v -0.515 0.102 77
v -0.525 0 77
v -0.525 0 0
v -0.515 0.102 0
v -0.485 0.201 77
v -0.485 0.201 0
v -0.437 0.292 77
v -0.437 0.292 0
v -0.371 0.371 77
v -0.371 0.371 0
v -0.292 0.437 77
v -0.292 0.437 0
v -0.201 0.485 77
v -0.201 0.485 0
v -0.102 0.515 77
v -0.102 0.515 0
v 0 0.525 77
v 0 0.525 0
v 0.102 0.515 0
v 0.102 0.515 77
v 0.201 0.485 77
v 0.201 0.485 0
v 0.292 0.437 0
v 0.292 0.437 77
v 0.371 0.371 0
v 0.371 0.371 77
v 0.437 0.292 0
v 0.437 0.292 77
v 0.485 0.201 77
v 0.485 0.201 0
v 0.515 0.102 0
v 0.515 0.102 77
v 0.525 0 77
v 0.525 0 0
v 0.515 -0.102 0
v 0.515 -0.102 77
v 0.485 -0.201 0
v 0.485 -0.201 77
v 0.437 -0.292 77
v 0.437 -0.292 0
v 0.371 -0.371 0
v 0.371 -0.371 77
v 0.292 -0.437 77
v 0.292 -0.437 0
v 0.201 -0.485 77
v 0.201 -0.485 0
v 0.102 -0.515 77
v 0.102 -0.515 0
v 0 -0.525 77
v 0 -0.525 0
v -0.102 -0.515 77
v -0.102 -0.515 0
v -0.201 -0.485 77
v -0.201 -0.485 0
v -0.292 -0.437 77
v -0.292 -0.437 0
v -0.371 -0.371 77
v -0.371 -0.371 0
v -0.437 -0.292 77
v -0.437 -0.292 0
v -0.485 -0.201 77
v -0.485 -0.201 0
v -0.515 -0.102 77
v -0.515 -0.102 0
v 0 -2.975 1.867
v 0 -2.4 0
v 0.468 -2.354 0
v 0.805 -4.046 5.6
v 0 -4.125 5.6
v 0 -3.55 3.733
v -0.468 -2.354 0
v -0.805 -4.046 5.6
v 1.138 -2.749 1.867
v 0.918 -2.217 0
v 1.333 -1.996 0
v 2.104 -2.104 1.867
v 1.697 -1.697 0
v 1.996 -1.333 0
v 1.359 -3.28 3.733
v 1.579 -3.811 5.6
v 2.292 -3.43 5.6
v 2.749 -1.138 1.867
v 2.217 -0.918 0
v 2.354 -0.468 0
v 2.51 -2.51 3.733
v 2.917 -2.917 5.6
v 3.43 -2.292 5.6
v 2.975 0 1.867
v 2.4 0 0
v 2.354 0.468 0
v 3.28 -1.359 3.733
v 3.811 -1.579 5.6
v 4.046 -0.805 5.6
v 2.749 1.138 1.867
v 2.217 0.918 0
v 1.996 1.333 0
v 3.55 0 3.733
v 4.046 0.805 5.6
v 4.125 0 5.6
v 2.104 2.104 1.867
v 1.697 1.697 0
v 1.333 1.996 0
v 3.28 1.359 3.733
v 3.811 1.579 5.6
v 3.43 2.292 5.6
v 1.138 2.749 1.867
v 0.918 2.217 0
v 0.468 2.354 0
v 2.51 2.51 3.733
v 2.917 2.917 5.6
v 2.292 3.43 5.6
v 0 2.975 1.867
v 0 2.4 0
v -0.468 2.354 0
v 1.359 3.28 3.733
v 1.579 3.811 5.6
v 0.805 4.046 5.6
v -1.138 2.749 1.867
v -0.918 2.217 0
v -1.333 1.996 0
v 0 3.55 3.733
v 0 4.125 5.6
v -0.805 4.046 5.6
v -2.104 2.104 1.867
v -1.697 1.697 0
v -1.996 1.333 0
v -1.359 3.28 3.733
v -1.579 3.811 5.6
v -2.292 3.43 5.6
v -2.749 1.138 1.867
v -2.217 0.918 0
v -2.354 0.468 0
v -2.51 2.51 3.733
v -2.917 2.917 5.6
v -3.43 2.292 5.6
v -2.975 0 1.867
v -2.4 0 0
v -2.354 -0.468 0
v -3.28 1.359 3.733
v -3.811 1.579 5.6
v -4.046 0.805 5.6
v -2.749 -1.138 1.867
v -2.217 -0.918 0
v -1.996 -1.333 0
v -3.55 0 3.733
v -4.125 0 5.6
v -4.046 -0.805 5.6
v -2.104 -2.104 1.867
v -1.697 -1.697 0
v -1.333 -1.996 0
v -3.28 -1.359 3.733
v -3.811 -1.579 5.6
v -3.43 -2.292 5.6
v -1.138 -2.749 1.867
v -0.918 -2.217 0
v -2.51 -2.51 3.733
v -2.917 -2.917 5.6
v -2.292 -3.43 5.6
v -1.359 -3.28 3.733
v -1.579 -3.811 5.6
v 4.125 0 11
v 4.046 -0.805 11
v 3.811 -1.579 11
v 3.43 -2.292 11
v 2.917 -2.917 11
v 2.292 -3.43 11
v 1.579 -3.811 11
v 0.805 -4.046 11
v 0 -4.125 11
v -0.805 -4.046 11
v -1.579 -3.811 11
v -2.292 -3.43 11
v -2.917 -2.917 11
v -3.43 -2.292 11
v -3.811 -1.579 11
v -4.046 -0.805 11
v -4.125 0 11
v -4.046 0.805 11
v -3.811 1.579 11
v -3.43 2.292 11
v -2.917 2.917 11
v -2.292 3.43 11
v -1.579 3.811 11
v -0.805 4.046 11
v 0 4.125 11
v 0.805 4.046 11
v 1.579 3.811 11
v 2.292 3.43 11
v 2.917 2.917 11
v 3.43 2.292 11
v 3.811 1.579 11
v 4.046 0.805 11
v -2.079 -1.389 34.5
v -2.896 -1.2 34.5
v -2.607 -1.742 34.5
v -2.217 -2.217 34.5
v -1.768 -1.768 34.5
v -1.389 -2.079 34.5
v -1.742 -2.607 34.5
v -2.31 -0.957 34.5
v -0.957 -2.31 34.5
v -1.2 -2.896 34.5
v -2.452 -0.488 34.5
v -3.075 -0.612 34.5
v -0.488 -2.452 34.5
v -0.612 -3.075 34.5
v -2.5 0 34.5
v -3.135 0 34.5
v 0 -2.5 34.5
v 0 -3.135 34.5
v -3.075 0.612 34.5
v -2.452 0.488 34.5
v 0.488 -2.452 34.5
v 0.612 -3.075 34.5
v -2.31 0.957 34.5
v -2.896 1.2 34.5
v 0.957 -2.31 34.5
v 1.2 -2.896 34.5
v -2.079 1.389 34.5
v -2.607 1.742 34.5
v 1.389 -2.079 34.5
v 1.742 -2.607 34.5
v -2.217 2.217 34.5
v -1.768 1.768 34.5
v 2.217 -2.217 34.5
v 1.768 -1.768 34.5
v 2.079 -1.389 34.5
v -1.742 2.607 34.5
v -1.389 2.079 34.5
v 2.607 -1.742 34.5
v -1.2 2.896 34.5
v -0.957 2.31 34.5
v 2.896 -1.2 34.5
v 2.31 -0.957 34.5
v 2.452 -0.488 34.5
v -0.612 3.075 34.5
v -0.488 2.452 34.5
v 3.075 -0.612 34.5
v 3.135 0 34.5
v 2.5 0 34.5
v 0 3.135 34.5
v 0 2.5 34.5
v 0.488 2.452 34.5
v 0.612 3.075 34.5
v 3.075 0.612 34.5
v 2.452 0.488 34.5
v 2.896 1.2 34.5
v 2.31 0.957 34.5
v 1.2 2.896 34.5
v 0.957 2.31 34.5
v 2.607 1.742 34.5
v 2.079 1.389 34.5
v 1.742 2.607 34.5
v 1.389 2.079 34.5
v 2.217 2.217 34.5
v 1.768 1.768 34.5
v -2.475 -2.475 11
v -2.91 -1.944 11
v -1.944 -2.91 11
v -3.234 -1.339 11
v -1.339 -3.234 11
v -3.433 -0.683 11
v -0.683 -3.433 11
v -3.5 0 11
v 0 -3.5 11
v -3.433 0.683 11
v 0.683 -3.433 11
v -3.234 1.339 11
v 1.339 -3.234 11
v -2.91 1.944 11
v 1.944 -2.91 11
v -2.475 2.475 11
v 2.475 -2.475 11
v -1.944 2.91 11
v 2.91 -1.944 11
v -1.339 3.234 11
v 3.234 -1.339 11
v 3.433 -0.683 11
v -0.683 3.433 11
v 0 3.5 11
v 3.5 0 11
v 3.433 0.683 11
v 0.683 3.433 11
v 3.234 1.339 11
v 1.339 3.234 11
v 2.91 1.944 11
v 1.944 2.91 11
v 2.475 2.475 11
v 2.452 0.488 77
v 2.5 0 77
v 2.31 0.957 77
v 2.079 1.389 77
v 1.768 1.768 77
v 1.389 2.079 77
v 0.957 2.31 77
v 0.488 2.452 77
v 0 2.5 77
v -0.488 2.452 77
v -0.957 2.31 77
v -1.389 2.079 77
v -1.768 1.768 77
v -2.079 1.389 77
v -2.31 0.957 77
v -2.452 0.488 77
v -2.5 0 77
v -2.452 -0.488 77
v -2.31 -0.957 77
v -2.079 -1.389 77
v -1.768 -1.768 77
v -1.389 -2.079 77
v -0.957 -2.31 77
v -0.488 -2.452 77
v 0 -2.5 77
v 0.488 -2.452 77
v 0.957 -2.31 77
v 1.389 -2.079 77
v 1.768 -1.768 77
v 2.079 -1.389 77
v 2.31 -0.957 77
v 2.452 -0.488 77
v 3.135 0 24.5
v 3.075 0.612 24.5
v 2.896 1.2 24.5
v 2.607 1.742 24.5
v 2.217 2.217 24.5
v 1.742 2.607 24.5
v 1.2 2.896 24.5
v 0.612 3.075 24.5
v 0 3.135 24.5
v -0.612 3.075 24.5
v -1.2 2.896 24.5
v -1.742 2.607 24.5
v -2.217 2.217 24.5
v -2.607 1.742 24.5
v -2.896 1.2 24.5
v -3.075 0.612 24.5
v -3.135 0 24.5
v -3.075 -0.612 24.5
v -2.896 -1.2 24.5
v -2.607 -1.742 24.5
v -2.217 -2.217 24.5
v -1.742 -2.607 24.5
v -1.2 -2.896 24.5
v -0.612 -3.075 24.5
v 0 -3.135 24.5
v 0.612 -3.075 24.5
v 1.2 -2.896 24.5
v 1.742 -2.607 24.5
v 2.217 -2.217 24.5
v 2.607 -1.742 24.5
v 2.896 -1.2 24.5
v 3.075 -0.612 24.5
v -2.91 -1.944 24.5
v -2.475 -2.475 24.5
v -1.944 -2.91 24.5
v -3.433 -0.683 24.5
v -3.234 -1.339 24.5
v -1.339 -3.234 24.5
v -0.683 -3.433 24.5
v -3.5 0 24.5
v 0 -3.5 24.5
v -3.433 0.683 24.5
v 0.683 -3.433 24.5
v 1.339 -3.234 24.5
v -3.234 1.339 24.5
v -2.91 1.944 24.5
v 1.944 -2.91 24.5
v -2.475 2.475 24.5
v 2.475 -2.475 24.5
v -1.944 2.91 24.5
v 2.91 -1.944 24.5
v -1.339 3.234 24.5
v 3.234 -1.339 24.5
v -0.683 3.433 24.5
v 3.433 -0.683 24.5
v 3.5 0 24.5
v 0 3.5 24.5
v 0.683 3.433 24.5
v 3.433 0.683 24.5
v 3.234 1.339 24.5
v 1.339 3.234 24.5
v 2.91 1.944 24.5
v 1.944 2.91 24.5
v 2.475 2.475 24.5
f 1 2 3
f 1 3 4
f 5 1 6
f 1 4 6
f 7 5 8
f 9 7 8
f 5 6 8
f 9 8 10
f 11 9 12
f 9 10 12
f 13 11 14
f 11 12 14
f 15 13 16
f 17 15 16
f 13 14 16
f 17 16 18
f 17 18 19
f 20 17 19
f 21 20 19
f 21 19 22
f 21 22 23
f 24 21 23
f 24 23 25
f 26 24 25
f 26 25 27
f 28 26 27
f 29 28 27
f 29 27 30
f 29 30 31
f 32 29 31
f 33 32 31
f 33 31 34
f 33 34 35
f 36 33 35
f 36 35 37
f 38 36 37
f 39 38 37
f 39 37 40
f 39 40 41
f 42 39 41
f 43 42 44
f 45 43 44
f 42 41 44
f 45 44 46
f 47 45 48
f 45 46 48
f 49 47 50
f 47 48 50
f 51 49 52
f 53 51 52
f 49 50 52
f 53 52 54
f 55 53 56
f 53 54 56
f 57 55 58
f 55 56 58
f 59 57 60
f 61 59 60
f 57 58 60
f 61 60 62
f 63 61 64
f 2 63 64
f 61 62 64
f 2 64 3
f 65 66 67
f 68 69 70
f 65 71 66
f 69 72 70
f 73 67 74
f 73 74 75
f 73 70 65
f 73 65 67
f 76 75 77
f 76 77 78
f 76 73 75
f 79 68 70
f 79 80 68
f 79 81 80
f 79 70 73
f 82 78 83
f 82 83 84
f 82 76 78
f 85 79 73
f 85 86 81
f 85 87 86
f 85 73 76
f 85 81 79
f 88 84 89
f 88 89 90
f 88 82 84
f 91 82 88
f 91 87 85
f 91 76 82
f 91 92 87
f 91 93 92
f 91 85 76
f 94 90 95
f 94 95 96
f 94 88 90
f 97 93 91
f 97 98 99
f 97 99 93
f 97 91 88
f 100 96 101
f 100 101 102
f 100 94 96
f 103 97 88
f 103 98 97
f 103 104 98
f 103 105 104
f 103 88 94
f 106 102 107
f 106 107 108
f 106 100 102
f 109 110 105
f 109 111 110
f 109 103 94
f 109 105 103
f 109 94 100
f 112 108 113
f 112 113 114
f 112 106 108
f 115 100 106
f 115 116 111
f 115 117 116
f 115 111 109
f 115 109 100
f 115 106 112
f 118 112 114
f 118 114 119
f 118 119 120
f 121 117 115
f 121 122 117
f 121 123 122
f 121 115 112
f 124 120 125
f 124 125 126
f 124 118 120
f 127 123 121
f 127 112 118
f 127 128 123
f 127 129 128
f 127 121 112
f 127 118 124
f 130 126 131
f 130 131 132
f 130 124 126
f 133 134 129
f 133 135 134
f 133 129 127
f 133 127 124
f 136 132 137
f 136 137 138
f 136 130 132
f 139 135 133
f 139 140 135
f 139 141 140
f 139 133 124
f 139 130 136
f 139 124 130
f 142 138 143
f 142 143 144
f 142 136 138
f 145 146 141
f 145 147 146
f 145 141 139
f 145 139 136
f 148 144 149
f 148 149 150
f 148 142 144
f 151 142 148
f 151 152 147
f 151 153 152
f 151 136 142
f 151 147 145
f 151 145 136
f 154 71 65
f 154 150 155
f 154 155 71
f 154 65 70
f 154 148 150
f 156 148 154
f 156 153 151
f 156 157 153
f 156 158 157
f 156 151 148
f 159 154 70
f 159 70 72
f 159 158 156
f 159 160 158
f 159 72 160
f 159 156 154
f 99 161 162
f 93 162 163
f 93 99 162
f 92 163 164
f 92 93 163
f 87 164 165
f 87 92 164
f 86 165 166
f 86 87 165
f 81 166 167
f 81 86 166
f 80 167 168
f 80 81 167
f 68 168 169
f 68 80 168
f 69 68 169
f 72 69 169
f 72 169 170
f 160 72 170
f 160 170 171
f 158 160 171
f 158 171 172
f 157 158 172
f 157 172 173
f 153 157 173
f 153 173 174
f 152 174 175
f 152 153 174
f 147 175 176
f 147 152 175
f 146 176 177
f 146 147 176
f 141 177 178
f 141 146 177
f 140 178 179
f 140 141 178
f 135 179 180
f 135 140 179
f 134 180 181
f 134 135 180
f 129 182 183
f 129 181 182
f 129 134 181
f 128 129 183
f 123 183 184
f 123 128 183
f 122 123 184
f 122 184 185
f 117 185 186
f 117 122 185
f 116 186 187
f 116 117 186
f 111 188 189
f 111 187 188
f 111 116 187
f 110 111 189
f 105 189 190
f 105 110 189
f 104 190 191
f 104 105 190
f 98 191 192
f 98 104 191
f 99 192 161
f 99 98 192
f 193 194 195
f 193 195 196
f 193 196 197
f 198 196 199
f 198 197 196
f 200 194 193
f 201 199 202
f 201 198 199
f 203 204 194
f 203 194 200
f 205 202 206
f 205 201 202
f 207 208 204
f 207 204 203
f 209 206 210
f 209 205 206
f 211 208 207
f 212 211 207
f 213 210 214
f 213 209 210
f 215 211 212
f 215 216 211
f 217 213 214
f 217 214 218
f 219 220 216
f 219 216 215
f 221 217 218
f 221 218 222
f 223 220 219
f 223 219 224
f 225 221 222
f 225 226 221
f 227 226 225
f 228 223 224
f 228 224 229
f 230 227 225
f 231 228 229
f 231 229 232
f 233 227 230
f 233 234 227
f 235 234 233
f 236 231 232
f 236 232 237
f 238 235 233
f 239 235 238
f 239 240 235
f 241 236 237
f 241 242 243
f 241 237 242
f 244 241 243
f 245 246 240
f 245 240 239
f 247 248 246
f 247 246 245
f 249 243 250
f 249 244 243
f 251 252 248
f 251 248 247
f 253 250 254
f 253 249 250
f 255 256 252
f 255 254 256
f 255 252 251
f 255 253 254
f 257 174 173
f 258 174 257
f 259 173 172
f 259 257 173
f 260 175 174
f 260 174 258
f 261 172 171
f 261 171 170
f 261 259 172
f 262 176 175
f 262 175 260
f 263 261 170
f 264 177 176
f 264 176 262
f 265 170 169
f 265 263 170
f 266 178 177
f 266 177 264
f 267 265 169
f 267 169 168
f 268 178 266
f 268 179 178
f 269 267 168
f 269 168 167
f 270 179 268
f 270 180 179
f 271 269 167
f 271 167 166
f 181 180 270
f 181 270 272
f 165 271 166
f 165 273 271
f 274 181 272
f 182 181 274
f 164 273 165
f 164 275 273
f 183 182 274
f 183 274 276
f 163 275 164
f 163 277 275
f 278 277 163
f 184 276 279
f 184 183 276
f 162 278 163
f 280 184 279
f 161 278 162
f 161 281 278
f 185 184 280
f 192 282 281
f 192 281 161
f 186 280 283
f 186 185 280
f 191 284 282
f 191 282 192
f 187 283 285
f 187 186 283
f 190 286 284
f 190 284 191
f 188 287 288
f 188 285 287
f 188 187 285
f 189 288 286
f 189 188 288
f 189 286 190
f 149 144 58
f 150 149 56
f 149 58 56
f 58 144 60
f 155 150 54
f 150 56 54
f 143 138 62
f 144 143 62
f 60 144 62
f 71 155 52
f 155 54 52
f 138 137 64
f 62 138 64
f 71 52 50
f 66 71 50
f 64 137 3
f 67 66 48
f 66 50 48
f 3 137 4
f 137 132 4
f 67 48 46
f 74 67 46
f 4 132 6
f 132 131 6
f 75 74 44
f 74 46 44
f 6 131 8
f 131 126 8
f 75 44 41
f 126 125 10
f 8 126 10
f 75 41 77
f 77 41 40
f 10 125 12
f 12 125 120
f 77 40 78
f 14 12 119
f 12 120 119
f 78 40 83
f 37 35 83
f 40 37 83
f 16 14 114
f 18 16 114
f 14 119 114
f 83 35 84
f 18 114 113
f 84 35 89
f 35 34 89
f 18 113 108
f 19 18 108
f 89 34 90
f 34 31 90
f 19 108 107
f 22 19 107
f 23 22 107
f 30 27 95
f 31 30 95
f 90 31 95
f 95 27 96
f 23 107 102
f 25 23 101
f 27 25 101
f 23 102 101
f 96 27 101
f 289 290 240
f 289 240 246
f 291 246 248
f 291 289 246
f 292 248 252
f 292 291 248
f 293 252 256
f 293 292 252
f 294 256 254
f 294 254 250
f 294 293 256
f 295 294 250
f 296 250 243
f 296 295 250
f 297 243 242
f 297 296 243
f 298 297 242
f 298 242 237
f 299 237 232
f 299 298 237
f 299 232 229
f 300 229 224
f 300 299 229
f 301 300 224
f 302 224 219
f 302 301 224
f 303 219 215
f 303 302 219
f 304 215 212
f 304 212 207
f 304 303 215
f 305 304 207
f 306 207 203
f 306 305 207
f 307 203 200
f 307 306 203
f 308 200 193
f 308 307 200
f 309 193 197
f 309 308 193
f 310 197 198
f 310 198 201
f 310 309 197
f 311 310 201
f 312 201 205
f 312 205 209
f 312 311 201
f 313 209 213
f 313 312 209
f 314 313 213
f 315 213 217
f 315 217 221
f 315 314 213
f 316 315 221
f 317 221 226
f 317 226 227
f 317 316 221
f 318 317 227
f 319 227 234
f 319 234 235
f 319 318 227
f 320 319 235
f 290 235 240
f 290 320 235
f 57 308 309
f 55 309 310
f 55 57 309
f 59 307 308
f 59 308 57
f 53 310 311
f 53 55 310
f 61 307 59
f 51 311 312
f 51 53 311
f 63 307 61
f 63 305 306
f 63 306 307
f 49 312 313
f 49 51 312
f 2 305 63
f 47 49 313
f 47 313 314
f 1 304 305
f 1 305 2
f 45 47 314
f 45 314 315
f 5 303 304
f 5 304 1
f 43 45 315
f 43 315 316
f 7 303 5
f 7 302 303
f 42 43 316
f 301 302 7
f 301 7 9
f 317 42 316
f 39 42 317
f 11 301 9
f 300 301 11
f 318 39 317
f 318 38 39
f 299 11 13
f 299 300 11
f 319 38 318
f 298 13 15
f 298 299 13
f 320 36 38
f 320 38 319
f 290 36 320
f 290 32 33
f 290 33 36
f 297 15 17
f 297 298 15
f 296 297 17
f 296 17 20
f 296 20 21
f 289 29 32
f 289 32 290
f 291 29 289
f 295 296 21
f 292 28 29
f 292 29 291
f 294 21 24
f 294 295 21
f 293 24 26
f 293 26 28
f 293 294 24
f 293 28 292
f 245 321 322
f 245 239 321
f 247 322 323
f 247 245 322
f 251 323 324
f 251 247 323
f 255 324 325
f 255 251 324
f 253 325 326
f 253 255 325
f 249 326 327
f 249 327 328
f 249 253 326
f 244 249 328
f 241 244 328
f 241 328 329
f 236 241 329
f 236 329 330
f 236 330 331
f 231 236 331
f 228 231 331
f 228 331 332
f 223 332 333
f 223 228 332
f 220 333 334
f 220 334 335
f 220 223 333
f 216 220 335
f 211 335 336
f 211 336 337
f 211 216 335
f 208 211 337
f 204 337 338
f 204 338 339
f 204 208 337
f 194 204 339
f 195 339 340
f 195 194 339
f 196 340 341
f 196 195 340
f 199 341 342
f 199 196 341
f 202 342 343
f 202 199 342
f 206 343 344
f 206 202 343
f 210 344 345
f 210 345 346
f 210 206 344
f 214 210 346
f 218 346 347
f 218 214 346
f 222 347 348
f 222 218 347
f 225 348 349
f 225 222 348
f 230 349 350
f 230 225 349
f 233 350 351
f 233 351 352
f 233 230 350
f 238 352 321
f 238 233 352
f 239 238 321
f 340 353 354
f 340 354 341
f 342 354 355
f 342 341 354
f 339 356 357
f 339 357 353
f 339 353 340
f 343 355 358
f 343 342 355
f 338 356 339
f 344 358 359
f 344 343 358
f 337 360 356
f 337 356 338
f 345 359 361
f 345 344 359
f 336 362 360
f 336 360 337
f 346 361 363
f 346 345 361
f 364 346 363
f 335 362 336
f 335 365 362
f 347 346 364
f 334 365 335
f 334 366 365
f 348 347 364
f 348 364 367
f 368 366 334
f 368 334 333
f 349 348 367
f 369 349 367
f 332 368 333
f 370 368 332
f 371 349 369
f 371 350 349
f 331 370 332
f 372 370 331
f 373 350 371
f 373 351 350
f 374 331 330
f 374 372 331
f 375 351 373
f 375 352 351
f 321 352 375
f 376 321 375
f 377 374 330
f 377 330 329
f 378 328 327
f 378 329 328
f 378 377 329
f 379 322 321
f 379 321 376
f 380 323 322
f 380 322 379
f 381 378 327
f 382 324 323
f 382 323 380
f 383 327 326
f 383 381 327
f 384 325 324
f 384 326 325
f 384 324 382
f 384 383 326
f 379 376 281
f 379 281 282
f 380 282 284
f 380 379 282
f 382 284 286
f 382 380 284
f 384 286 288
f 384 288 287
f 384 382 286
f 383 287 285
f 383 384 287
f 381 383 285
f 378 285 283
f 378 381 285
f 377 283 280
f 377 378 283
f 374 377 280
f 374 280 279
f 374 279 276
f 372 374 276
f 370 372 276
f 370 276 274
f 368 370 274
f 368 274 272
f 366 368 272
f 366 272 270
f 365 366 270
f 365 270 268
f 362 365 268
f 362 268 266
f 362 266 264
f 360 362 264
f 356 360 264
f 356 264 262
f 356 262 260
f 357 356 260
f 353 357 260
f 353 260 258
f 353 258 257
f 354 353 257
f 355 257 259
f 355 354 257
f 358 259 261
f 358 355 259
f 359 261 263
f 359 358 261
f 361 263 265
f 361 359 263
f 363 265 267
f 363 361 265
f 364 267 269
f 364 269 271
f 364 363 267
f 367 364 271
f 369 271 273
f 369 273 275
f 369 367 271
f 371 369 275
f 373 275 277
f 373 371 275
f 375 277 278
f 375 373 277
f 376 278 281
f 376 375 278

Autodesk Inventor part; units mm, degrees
ref_plane "YZ Plane" through (0, 0, 0) normal (1, 0, 0) x (0, 1, 0)
ref_plane "XZ Plane" through (0, 0, 0) normal (0, 1, 0) x (-1, 0, 0)
ref_plane "XY Plane" through (0, 0, 0) normal (0, 0, 1) x (1, 0, 0)
sketch "Sketch1" plane through (0, 0, 0) normal (0, 0, 1) x (1, 0, 0)
  circle A0 centre (0, 0) radius 4.125
  dimension "d0" = 8.25
extrude "Extrusion1" add sketch "Sketch1" along normal blind 77
sketch "Sketch2" plane through (0, 0, 0) normal (1, 0, 0) x (0, 1, 0)
  line L0 (-4.125, 0) -> (-4.125, 77) projected
  line L1 (4.125, 0) -> (4.125, 77) projected
  line L2 (0, -15.4) -> (0, 92.4) projected
  line L3 (-5.775, 0) -> (5.775, 0) projected
  line L4 (2.4, 0) -> (0, 0)
  line L5 (0, 5.6) -> (4.125, 5.6)
  line L6 (4.125, 5.6) -> (4.125, 0)
  line L7 (-4.125, 0) -> (-4.125, 5.6)
  line L8 (-4.125, 5.6) -> (-2.4, 0)
  line L9 (4.125, 0) -> (0, 0)
  line L10 (-2.4, 0) -> (-4.125, 0)
  point P0 (0, 3.0897)
  dimension "d4" = 5.6
revolve "Revolution1" cut sketch "Sketch2" angle 360 about axis through (0, 0, -10) along (0, 0, 1) contours L0 L8 L3
sketch "Sketch3" plane through (0, 0, 77) normal (0, 0, 1) x (1, 0, 0)
  circle A0 centre (0, 0) radius 4.125 projected
  circle A1 centre (0, 0) radius 2.5
  dimension "d19" = 5
extrude "Extrusion2" cut sketch "Sketch3" against normal blind 42.5
sketch "Sketch4" plane through (0, 0, 34.5) normal (0, 0, 1) x (1, 0, 0)
  circle A0 centre (0, 0) radius 4.125 projected
  circle A1 centre (0, 0) radius 3.135
  dimension "d22" = 6.27
extrude "Extrusion3" cut sketch "Sketch4" against normal blind 10
sketch "Sketch5" plane through (0, 0, 24.5) normal (0, 0, 1) x (1, 0, 0)
  circle A0 centre (0, 0) radius 4.125 projected
  circle A1 centre (0, 0) radius 3.5
  dimension "d25" = 7
extrude "Extrusion4" cut sketch "Sketch5" against normal blind 13.5
sketch "Sketch6" plane through (0, 0, 0) normal (0, 0, -1) x (-1, 0, 0)
  circle A0 centre (0, 0) radius 2.4 projected
  circle A1 centre (0, 0) radius 0.525
  dimension "d28" = 1.05
extrude "Extrusion5" cut sketch "Sketch6" against normal through all contours A1
properties part number "Collect_Jaw"
